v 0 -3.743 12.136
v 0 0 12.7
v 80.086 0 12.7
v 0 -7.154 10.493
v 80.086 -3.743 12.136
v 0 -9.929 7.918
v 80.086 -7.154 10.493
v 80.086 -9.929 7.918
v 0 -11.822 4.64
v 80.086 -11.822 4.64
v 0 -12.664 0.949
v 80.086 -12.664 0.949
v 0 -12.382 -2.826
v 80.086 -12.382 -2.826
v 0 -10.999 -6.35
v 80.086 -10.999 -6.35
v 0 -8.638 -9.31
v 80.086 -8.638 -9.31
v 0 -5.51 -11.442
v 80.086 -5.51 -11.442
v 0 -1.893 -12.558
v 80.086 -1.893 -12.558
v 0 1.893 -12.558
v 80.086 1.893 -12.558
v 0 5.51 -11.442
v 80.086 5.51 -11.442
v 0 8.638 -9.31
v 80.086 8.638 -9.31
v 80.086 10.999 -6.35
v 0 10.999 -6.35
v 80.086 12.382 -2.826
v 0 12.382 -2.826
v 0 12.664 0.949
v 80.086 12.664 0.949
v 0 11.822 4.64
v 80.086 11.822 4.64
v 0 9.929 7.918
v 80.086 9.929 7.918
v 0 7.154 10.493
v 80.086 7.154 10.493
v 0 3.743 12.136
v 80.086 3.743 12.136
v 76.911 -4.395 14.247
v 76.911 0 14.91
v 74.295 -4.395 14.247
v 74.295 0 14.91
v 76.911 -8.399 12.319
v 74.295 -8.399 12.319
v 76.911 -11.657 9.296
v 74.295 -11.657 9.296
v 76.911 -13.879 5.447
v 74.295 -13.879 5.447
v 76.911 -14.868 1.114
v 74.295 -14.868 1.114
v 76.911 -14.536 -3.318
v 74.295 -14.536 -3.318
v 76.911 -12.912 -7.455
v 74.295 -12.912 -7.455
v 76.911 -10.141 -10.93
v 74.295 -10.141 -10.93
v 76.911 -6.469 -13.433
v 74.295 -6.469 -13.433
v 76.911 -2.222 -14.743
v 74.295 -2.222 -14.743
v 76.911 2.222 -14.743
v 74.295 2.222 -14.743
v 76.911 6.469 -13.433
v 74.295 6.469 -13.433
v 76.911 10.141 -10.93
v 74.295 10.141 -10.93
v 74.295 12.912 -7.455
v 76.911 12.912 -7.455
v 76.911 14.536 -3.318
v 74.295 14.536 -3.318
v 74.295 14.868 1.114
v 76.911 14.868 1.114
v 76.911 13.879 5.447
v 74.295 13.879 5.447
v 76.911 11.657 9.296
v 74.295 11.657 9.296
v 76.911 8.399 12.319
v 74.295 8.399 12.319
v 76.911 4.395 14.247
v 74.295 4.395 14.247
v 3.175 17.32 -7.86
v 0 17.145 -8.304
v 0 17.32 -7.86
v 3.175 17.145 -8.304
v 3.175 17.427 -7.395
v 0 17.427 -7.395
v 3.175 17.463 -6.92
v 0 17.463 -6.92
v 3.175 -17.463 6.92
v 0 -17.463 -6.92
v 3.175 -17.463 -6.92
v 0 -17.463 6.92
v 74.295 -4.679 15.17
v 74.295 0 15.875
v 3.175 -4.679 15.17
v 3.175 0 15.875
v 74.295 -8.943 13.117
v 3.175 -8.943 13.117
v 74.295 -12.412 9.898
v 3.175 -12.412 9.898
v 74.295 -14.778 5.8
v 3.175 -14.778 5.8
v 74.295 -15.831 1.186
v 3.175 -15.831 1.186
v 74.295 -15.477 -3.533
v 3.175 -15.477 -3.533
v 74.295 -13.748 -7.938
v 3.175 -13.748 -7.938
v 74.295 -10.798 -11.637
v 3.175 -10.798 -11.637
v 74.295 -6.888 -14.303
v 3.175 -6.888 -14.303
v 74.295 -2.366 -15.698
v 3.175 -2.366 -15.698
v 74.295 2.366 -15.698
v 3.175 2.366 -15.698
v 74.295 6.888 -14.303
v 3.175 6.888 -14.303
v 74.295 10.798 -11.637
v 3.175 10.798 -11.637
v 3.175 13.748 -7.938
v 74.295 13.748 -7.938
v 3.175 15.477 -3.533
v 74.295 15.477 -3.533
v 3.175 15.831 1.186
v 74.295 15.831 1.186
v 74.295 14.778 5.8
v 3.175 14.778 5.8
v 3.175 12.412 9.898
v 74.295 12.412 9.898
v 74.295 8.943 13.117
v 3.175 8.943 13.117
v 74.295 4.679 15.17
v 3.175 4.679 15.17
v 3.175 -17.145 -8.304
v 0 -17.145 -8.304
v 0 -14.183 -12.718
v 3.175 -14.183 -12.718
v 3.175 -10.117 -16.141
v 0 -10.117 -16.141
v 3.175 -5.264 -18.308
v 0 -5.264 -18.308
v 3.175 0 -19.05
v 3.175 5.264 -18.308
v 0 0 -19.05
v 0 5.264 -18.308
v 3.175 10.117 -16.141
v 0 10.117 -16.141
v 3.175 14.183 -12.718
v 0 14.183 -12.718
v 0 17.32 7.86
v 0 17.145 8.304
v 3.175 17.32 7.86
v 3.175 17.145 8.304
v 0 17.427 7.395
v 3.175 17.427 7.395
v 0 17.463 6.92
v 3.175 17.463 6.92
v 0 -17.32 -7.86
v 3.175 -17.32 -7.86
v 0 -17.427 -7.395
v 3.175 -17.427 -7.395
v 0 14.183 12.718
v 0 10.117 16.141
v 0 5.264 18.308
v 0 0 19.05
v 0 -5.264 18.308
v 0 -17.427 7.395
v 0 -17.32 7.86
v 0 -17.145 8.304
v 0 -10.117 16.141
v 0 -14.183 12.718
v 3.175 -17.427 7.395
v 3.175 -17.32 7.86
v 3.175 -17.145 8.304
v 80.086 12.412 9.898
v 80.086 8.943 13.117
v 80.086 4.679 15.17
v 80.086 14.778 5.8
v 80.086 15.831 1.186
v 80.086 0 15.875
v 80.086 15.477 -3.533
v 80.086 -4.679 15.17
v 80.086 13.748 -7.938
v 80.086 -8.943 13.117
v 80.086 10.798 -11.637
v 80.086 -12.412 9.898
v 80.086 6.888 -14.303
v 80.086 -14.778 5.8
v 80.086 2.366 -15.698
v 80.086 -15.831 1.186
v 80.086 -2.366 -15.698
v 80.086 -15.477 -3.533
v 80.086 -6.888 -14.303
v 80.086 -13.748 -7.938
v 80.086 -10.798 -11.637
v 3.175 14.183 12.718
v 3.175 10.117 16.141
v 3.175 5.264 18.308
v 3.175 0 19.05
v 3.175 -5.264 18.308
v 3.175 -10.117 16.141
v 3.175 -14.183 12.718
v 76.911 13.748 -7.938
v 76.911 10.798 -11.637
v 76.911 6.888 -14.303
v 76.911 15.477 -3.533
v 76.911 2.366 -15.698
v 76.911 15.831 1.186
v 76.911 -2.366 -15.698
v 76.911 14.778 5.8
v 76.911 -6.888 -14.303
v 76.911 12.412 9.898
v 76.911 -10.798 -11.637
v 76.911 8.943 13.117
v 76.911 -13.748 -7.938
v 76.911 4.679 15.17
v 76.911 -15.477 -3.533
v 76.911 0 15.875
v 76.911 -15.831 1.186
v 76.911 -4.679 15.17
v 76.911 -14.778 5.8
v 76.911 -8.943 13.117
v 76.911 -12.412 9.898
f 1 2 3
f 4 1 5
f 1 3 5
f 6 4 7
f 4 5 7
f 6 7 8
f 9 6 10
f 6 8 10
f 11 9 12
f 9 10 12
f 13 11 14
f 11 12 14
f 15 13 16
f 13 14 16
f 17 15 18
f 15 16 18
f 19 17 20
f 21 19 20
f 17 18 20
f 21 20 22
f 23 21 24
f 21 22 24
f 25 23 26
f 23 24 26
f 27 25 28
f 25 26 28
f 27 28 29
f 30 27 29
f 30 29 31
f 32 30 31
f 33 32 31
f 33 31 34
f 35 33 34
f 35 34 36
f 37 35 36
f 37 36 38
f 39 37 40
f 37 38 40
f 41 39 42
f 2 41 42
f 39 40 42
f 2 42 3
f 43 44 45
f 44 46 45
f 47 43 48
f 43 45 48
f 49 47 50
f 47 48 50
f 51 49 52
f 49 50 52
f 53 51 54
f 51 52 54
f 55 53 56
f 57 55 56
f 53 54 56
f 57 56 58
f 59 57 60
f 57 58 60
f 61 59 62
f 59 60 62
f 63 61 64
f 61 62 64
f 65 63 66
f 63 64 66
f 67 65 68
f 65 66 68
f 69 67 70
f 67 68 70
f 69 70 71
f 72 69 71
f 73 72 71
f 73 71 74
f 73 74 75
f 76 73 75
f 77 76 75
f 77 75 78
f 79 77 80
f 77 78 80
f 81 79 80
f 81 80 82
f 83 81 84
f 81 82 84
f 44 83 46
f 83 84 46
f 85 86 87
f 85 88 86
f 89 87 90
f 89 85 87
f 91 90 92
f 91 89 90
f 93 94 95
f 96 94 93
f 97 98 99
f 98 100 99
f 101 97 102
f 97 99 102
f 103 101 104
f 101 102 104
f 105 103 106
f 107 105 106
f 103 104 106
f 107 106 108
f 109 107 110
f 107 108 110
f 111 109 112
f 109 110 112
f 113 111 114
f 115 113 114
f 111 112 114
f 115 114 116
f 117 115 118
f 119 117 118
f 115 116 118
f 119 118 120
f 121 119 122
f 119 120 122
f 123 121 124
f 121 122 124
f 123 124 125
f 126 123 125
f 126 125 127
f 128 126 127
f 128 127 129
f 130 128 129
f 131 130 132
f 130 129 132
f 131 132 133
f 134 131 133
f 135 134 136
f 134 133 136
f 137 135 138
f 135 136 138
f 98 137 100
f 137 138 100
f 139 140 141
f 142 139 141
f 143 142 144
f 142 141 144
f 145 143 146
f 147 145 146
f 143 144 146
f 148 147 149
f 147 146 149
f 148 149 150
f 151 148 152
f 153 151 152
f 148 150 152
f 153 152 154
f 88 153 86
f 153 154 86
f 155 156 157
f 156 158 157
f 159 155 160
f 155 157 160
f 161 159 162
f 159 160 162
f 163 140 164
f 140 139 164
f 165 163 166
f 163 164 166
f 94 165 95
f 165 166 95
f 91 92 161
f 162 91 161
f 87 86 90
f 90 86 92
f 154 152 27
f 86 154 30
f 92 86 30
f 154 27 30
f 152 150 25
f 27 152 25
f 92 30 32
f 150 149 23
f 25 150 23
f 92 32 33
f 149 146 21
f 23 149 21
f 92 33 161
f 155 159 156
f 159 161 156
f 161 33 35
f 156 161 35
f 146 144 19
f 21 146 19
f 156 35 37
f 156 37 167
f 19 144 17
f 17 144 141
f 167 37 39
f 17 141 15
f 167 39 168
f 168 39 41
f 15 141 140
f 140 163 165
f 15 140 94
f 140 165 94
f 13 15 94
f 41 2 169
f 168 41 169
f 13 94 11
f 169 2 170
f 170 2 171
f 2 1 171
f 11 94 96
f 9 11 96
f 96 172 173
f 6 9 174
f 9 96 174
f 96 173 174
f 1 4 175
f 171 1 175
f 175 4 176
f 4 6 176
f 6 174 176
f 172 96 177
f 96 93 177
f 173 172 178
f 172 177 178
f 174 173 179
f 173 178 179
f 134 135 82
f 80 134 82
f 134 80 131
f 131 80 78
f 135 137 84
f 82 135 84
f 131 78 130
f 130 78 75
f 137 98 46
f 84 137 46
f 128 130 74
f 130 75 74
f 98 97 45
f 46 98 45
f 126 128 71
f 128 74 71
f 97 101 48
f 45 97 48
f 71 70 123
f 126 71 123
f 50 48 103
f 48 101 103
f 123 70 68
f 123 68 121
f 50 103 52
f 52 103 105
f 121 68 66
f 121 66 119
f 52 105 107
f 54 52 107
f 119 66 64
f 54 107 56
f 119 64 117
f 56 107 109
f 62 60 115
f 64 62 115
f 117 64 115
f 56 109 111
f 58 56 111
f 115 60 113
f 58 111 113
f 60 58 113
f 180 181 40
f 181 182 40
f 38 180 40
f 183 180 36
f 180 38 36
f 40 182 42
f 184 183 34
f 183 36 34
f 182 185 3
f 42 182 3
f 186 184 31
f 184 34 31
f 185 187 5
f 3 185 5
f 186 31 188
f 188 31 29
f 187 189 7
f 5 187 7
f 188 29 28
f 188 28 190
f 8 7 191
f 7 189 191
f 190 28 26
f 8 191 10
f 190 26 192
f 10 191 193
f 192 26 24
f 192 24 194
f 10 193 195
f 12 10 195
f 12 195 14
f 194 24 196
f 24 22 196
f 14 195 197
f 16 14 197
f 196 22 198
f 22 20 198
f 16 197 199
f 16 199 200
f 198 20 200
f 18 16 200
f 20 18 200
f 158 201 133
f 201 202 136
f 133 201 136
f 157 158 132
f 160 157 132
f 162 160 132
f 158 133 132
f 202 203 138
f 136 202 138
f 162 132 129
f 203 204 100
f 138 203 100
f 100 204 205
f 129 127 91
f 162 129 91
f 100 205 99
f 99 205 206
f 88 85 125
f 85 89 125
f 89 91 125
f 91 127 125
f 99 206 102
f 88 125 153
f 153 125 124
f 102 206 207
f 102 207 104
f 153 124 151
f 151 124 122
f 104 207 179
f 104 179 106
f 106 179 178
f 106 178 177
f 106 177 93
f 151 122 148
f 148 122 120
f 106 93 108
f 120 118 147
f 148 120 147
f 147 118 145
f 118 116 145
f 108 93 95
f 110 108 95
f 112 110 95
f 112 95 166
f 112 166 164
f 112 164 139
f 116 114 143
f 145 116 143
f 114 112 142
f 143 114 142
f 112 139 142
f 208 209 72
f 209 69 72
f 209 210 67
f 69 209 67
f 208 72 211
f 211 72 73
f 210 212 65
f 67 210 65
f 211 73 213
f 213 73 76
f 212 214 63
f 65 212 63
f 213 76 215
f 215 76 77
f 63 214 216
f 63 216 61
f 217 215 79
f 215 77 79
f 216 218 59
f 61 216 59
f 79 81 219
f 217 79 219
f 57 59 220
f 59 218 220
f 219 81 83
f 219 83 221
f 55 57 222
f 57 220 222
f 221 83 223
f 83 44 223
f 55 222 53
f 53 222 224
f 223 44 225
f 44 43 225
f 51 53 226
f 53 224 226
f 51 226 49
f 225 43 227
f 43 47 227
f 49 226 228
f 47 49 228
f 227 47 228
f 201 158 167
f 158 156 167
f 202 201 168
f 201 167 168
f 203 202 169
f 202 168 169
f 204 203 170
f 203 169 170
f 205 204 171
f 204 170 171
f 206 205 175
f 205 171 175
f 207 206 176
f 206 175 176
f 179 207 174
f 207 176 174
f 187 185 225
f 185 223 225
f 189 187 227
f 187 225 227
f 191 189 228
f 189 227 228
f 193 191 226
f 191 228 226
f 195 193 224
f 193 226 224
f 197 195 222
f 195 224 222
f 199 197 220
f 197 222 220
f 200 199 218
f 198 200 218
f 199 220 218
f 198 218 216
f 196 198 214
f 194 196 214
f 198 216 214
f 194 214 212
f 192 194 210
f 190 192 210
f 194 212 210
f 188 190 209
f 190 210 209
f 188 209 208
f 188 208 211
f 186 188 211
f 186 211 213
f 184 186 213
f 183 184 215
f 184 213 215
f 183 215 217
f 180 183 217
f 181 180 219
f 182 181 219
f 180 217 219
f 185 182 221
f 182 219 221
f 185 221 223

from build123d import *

# Parameters (mm, degrees)
SKETCH2_W          = 15.226765086
SKETCH2_H          = 1.5875
CUT_EXTRUDE1_DEPTH = 85.496179975
FILLET1_R          = 3.175


with BuildPart() as part:
    # Sketch1 → Revolve1 (revolve)
    with BuildSketch(Plane.XY, mode=Mode.PRIVATE) as revolve1_sk:
        Polygon((0, 19.05), (0, 12.7), (80.0862, 12.7), (80.0862, 15.875), (76.9112, 15.875), (76.9112, 14.9098), (74.295, 14.9098), (74.295, 15.875), (3.175, 15.875), (3.175, 19.05), align=None)
    revolve(revolve1_sk.sketch.rotate(Axis((0, 0, 0), (1, 0, 0)), 90), axis=Axis((0, 0, 0), (1, 0, 0)))

    # Sketch2 → Cut-Extrude1 (cut, through all)
    with BuildSketch(Plane.ZY):
        with Locations((0, 18.25625)):
            Rectangle(SKETCH2_W, SKETCH2_H)
        with Locations((0, -18.25625)):
            Rectangle(SKETCH2_W, SKETCH2_H)
    extrude(amount=-CUT_EXTRUDE1_DEPTH, mode=Mode.SUBTRACT)

    # Fillet1
    fillet1_edges = [part.edges().sort_by_distance(p)[0] for p in [
        (1.5875, 17.4625, 7.613382543),
        (1.5875, 17.4625, -7.613382543),
        (1.5875, -17.4625, -7.613382543),
        (1.5875, -17.4625, 7.613382543),
    ]]
    fillet(fillet1_edges, radius=FILLET1_R)


solid = part.part
